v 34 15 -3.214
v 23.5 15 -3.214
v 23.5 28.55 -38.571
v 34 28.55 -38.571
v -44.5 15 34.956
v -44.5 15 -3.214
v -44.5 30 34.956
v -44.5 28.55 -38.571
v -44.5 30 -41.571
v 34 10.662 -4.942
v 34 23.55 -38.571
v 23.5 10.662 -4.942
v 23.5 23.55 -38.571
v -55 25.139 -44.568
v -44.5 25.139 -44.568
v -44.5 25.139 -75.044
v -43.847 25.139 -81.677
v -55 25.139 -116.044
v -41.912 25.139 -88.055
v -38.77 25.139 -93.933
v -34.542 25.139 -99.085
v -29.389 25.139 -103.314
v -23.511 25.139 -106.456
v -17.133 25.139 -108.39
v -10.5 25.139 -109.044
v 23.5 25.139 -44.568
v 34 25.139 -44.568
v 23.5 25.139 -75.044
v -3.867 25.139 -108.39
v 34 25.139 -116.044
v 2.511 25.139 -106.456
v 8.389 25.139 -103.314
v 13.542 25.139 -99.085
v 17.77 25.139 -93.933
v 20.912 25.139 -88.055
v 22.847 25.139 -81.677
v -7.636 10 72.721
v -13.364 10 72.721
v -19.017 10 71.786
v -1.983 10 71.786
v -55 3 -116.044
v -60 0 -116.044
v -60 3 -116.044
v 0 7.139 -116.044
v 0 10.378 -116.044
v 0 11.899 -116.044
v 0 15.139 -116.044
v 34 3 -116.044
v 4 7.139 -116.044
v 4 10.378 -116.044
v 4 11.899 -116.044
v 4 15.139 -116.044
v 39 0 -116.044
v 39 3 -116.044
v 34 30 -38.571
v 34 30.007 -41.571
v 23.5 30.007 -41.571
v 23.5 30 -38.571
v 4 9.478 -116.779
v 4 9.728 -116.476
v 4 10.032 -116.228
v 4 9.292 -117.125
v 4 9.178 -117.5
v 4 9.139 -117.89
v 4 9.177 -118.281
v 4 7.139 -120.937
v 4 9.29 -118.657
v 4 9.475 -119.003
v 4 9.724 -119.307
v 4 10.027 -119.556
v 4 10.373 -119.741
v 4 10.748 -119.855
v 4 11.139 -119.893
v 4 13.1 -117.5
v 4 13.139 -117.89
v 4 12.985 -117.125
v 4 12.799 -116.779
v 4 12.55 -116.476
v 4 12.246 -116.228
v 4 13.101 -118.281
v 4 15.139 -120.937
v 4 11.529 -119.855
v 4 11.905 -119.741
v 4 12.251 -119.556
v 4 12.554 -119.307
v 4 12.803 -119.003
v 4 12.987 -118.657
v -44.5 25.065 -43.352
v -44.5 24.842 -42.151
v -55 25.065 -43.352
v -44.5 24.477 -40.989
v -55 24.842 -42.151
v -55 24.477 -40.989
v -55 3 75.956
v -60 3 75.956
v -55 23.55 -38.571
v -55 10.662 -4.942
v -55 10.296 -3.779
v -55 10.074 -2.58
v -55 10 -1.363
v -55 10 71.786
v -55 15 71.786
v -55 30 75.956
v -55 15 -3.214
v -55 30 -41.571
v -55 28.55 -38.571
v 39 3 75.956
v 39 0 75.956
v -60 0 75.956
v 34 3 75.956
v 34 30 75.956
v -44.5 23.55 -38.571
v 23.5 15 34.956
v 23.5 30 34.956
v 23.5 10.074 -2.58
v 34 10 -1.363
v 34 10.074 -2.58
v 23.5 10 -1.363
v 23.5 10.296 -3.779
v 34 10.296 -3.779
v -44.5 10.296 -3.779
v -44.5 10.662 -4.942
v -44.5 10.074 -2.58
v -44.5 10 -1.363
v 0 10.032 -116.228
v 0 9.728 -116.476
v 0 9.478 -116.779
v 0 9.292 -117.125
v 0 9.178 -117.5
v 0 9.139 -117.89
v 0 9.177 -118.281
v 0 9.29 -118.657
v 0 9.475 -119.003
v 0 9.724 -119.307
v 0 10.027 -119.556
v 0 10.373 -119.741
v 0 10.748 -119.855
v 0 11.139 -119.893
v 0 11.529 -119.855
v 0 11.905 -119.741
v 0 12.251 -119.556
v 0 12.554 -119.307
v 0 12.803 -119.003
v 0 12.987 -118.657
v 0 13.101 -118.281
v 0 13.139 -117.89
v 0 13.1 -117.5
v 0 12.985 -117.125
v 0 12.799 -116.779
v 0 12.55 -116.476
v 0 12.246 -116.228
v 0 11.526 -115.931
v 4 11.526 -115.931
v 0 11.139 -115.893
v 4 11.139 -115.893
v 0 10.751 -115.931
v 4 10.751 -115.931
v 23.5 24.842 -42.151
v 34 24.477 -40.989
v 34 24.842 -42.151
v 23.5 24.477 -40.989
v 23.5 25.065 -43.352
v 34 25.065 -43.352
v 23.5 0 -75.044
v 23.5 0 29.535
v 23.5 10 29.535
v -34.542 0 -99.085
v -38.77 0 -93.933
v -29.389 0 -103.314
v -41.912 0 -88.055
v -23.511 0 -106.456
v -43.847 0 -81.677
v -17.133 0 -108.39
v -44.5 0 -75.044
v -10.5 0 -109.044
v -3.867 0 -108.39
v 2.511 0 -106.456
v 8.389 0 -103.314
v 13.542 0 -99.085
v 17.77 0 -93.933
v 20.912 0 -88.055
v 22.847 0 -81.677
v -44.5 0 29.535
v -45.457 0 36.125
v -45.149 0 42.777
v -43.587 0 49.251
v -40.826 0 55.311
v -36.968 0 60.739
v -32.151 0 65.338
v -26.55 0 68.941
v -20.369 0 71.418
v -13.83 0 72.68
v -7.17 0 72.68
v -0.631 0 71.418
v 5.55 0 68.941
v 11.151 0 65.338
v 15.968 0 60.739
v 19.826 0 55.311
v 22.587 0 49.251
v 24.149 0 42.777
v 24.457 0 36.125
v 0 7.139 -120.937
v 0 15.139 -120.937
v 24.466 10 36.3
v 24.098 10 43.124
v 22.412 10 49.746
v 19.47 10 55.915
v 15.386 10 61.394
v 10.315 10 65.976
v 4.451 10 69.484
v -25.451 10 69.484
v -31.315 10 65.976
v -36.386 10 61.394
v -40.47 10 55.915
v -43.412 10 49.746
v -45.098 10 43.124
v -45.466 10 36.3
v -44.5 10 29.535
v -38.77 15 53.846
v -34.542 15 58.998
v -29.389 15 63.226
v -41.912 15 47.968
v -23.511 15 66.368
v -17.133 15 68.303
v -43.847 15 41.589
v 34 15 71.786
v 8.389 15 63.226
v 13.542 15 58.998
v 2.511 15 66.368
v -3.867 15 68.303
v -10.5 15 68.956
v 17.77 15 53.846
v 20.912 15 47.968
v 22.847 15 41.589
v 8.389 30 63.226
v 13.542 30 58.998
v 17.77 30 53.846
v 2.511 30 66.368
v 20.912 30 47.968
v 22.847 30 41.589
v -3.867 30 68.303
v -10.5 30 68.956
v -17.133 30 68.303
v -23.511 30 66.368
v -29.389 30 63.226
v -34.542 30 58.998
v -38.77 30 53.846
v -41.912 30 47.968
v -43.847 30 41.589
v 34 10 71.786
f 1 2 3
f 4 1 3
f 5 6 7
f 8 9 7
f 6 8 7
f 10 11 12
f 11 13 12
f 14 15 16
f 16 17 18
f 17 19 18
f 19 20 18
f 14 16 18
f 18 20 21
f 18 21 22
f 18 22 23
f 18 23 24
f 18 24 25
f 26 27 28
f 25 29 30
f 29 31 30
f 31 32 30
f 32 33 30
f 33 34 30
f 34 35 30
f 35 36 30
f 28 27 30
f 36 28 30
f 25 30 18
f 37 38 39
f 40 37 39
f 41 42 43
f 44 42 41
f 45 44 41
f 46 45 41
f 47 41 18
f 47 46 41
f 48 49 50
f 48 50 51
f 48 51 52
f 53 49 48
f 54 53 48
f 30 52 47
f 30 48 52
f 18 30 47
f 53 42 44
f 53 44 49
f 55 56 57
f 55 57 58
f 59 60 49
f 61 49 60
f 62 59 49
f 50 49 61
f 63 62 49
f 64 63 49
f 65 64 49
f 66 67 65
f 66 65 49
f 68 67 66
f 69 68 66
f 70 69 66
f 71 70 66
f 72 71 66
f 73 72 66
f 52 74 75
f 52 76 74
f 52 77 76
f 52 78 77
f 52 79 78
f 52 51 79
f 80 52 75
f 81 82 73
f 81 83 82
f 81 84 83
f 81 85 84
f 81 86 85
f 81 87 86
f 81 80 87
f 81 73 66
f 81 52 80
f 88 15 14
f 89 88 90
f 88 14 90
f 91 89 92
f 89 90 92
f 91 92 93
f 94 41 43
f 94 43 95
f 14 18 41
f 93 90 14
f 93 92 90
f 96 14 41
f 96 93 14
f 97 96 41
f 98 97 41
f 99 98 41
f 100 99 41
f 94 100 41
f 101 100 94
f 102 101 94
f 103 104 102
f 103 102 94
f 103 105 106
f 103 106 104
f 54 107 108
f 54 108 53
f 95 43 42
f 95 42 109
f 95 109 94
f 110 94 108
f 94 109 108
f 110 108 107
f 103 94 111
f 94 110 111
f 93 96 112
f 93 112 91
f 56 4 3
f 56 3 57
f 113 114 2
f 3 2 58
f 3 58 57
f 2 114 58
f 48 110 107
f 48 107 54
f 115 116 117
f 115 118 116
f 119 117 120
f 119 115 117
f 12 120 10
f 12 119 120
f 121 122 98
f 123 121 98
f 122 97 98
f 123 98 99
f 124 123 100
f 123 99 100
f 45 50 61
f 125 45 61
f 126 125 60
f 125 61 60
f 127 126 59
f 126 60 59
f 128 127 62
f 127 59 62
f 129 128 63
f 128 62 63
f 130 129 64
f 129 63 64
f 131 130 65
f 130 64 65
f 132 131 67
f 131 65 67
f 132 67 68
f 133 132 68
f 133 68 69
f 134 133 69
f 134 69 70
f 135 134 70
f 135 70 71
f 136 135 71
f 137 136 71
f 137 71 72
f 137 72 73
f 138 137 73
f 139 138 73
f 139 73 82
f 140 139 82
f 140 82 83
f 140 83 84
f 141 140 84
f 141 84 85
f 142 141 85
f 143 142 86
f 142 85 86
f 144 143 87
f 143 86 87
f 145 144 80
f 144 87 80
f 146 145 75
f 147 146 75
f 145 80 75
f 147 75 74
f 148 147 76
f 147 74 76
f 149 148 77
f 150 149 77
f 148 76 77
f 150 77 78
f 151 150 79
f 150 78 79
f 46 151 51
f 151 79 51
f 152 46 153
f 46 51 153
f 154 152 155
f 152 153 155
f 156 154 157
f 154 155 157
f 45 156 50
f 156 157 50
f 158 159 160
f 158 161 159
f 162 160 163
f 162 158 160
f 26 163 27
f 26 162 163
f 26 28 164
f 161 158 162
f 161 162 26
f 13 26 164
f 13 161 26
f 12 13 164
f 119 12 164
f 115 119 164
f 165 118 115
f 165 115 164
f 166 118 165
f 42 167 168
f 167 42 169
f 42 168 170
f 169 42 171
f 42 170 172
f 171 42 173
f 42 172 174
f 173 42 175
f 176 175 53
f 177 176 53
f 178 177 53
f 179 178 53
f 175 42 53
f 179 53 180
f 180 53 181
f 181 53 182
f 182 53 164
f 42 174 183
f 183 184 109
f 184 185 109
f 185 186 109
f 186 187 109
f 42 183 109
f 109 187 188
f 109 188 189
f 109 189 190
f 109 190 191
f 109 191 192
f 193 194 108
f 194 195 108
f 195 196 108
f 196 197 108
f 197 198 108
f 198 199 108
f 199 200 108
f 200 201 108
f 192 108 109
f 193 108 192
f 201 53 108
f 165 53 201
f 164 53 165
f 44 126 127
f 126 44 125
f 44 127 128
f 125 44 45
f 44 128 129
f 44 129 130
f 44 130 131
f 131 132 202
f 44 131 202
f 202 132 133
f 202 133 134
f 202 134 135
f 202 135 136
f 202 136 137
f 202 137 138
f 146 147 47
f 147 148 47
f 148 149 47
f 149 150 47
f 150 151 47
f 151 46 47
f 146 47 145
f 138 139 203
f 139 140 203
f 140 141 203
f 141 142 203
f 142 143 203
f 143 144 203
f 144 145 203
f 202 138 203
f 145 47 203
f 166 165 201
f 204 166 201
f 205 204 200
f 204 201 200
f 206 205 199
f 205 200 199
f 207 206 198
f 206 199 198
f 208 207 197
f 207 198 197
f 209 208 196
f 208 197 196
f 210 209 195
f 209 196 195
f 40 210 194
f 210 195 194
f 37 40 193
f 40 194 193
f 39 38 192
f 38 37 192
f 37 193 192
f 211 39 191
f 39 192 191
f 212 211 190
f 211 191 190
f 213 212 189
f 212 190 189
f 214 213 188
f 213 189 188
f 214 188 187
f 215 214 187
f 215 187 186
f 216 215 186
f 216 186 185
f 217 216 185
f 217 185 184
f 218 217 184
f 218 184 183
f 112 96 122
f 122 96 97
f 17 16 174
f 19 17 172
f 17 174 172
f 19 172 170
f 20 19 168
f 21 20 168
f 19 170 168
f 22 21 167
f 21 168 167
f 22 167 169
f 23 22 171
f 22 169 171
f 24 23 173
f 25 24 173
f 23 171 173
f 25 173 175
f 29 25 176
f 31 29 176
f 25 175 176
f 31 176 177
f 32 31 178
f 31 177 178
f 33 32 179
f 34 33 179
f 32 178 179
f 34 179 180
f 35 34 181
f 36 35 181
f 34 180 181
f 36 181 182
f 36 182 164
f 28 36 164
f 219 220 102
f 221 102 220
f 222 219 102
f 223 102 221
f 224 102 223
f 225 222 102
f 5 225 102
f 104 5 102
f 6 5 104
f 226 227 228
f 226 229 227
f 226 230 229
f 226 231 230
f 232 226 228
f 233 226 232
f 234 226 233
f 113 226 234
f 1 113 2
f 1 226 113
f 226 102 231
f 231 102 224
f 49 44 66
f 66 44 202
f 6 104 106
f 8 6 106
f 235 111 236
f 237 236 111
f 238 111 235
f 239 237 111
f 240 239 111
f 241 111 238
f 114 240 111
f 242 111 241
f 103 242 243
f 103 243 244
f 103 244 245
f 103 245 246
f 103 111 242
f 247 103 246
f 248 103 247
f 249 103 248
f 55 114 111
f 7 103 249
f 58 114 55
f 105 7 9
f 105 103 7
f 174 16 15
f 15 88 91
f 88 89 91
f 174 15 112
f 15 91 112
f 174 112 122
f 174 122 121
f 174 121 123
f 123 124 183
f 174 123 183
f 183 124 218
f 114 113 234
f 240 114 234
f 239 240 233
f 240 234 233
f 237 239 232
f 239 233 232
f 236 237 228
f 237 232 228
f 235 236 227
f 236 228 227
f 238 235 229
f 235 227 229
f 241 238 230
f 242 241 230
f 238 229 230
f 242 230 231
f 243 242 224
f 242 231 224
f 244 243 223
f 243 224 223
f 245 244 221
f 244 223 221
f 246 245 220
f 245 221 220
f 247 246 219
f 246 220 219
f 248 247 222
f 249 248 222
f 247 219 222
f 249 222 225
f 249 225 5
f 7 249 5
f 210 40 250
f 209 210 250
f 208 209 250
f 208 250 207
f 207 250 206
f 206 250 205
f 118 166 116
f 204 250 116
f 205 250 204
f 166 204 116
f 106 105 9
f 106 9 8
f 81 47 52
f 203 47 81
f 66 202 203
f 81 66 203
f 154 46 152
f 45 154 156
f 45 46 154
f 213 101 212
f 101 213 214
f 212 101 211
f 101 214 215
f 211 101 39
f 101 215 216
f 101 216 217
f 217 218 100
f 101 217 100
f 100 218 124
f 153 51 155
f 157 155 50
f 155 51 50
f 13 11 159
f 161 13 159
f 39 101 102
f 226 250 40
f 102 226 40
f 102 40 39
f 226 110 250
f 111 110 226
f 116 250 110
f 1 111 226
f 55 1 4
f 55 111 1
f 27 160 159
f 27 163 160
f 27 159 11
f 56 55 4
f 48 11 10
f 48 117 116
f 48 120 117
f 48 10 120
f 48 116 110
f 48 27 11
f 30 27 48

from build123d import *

# Parameters (mm, degrees)
SKETCH1_W            = 89
SKETCH1_H            = 192
BOSS_EXTRUDE1_DEPTH  = 30
SKETCH2_R            = 34.99943994
CUT_EXTRUDE1_DEPTH   = 10
SKETCH3_W            = 75
SKETCH3_H            = 5
CUT_EXTRUDE2_DEPTH   = 102
CUT_EXTRUDE4_DEPTH   = 102
SKETCH6_W            = 10.5
SKETCH6_H            = 4
CUT_EXTRUDE7_DEPTH   = 8
BOSS_EXTRUDE2_DEPTH  = 10.5
CUT_EXTRUDE8_DEPTH   = 20.767757578
BOSS_EXTRUDE3_DEPTH  = 10.5
CUT_EXTRUDE9_DEPTH   = 22.812544275
BOSS_EXTRUDE6_DEPTH  = 10.5
BOSS_EXTRUDE7_DEPTH  = 10.5
FILLET1_R            = 10
FILLET2_R            = 10
FILLET3_R            = 10
FILLET4_R            = 10
CUT_EXTRUDE11_DEPTH  = 99
SKETCH15_W           = 7.554212703
SKETCH15_H           = 3.259234926
CUT_EXTRUDE12_DEPTH  = 99
FILLET5_R            = 10
SKETCH16_W           = 4.893814379
SKETCH16_H           = 8
BOSS_EXTRUDE8_DEPTH  = 4
SKETCH17_R           = 2
CUT_EXTRUDE13_DEPTH  = 4
SKETCH18_W           = 192
SKETCH18_H           = 3
BOSS_EXTRUDE9_DEPTH  = 5
SKETCH19_W           = 192
SKETCH19_H           = 3
BOSS_EXTRUDE10_DEPTH = 5


with BuildPart() as part:
    # Sketch1 → Boss-Extrude1 (new body)
    with BuildSketch(Plane(origin=(0, 0, 0), x_dir=(1, 0, 0), z_dir=(0, 1, 0))):
        with Locations((-10.5, 20.043668932)):
            Rectangle(SKETCH1_W, SKETCH1_H)
        with BuildLine():
            Line((-44.5, -34.956331068), (-44.5, 75.043668932))
            ThreePointArc((-44.5, 75.043668932), (-10.5, 109.043668932), (23.5, 75.043668932))
            Line((23.5, 75.043668932), (23.5, -34.956331068))
            ThreePointArc((23.5, -34.956331068), (-10.5, -68.956331068), (-44.5, -34.956331068))
        make_face(mode=Mode.SUBTRACT)
    extrude(amount=BOSS_EXTRUDE1_DEPTH)

    # Sketch2 → Cut-Extrude1 (cut)
    with BuildSketch(Plane.XZ):
        with Locations((-10.5, 37.838844027)):
            Circle(SKETCH2_R)
    extrude(amount=-CUT_EXTRUDE1_DEPTH, mode=Mode.SUBTRACT)

    # Sketch3 → Cut-Extrude2 (cut)
    with BuildSketch(Plane(origin=(34, 0, 0), x_dir=(0, 0, -1), z_dir=(1, 0, 0))):
        with Locations((-34.286288065, 12.5)):
            Rectangle(SKETCH3_W, SKETCH3_H)
    extrude(amount=-CUT_EXTRUDE2_DEPTH, mode=Mode.SUBTRACT)

    # Sketch4 → Cut-Extrude4 (cut)
    with BuildSketch(Plane.ZY.offset(55)):
        Polygon((-40.970715348, 29.469395922), (-41.211628541, 24.561719678), (-3.213711935, 10), (-3.213711935, 15), align=None)
    extrude(amount=-CUT_EXTRUDE4_DEPTH, mode=Mode.SUBTRACT)

    # Sketch6 → Cut-Extrude7 (cut)
    with BuildSketch(Plane(origin=(0, 30, 0), x_dir=(1, 0, 0), z_dir=(0, 1, 0))):
        with Locations((-49.75, 40.570603007)):
            Rectangle(SKETCH6_W, SKETCH6_H)
        with Locations((28.75, 40.570603007)):
            Rectangle(SKETCH6_W, SKETCH6_H)
    extrude(amount=-CUT_EXTRUDE7_DEPTH, mode=Mode.SUBTRACT)

    # Sketch7 → Boss-Extrude2 (add)
    with BuildSketch(Plane.ZY.offset(55)):
        Polygon((-38.570603007, 23.549614886), (-42.570603007, 25.082511526), (-42.570603007, 22), (-38.570603007, 22), align=None)
    extrude(amount=-BOSS_EXTRUDE2_DEPTH)

    # Sketch8 → Cut-Extrude8 (cut)
    with BuildSketch(Plane.ZY.offset(55)):
        Polygon((-42.570603007, 25.082511526), (-55.402488324, 30), (-42.570603007, 30), align=None)
    extrude(amount=-CUT_EXTRUDE8_DEPTH, mode=Mode.SUBTRACT)

    # Sketch9 → Boss-Extrude3 (add)
    with BuildSketch(Plane(origin=(34, 0, 0), x_dir=(0, 0, -1), z_dir=(1, 0, 0))):
        Polygon((38.570603007, 23.549614886), (42.570603007, 25.082511526), (42.570603007, 22), (38.570603007, 22), align=None)
    extrude(amount=-BOSS_EXTRUDE3_DEPTH)

    # Sketch10 → Cut-Extrude9 (cut)
    with BuildSketch(Plane(origin=(34, 0, 0), x_dir=(0, 0, -1), z_dir=(1, 0, 0))):
        Polygon((42.570603007, 25.082511526), (55.402488324, 30), (42.570603007, 30), align=None)
    extrude(amount=-CUT_EXTRUDE9_DEPTH, mode=Mode.SUBTRACT)

    # Sketch12 → Boss-Extrude6 (add)
    with BuildSketch(Plane.ZY.offset(55)):
        Polygon((-38.570603007, 30), (-41.570603007, 30), (-38.570603007, 28.549614886), align=None)
    extrude(amount=-BOSS_EXTRUDE6_DEPTH)

    # Sketch11 → Boss-Extrude7 (add)
    with BuildSketch(Plane(origin=(34, 0, 0), x_dir=(0, 0, -1), z_dir=(1, 0, 0))):
        Polygon((38.570603007, 28.549614886), (41.570603007, 30.007074027), (38.570603007, 30), align=None)
    extrude(amount=-BOSS_EXTRUDE7_DEPTH)

    # Fillet1
    fillet1_edges = [part.edges().sort_by_distance(p)[0] for p in [
        (-49.75, 30, -55.402488324),
    ]]
    fillet(fillet1_edges, radius=FILLET1_R)

    # Fillet2
    fillet2_edges = [part.edges().sort_by_distance(p)[0] for p in [
        (28.75, 30, -55.402488324),
    ]]
    fillet(fillet2_edges, radius=FILLET2_R)

    # Fillet3
    fillet3_edges = [part.edges().sort_by_distance(p)[0] for p in [
        (-49.75, 10, -3.213711935),
    ]]
    fillet(fillet3_edges, radius=FILLET3_R)

    # Fillet4
    fillet4_edges = [part.edges().sort_by_distance(p)[0] for p in [
        (28.75, 10, -3.213711935),
    ]]
    fillet(fillet4_edges, radius=FILLET4_R)

    # Sketch14 → Cut-Extrude11 (cut)
    with BuildSketch(Plane(origin=(34, 0, 0), x_dir=(0, 0, -1), z_dir=(1, 0, 0))):
        Polygon((42.717415751, 25.138773717), (116.043668932, 25.138773717), (116.043668932, 30), (57.252994033, 30), (53.674522762, 29.337801849), align=None)
    extrude(amount=-CUT_EXTRUDE11_DEPTH, mode=Mode.SUBTRACT)


with BuildPart() as cut_extrude11_piece_1:
    # of the separate pieces the step leaves, piece 1, a body of its own (cut_extrude11_pieces)
    add(part.part.solids().sort_by_distance((23.5, 25.138773717, -42.717415751))[0])

    # Fillet5
    fillet5_edges = [cut_extrude11_piece_1.edges().sort_by_distance(p)[0] for p in [
        (-49.75, 25.138773717, -42.717415751),
        (28.75, 25.138773717, -42.717415751),
    ]]
    fillet(fillet5_edges, radius=FILLET5_R)

    # Sketch16 → Boss-Extrude8 (add)
    with BuildSketch(Plane(origin=(0, 0, 0), x_dir=(0, 0, -1), z_dir=(1, 0, 0))):
        with Locations((118.490576121, 11.138773717)):
            Rectangle(SKETCH16_W, SKETCH16_H)
    extrude(amount=BOSS_EXTRUDE8_DEPTH)

    # Sketch17 → Cut-Extrude13 (cut)
    with BuildSketch(Plane(origin=(4, 0, 0), x_dir=(0, 0, -1), z_dir=(1, 0, 0))):
        with Locations(Location((117.893374439, 11.138773717, 0), (0, 0, 202.353838102))):
            Circle(SKETCH17_R)
    extrude(amount=-CUT_EXTRUDE13_DEPTH, mode=Mode.SUBTRACT)

    # Sketch18 → Boss-Extrude9 (add)
    with BuildSketch(Plane(origin=(34, 0, 0), x_dir=(0, 0, -1), z_dir=(1, 0, 0))):
        with Locations((20.043668932, 1.5)):
            Rectangle(SKETCH18_W, SKETCH18_H)
    extrude(amount=BOSS_EXTRUDE9_DEPTH)

    # Sketch19 → Boss-Extrude10 (add)
    with BuildSketch(Plane.ZY.offset(55)):
        with Locations((-20.043668932, 1.5)):
            Rectangle(SKETCH19_W, SKETCH19_H)
    extrude(amount=BOSS_EXTRUDE10_DEPTH)


with BuildPart() as cut_extrude11_piece_2:
    # of the separate pieces the step leaves, piece 2, a body of its own (cut_extrude11_pieces)
    add(part.part.solids().sort_by_distance((23.5, 30, -57.252994033))[0])


with BuildPart() as cut_extrude11_piece_3:
    # of the separate pieces the step leaves, piece 3, a body of its own (cut_extrude11_pieces)
    add(part.part.solids().sort_by_distance((-55, 30, -57.252994033))[0])


with BuildPart() as cut_extrude12_tool:
    # Sketch15 → Cut-Extrude12 (new body)
    with BuildSketch(Plane(origin=(34, 0, 0), x_dir=(0, 0, -1), z_dir=(1, 0, 0))):
        with Locations((54.846987071, 29.864387296)):
            Rectangle(SKETCH15_W, SKETCH15_H)
    extrude(amount=-CUT_EXTRUDE12_DEPTH)


with BuildPart() as cut_extrude11_piece_2_1:
    add(cut_extrude11_piece_2.part)

    # Cut-Extrude12: cut by cut_extrude12_tool
    add(cut_extrude12_tool.part, mode=Mode.SUBTRACT)


with BuildPart() as cut_extrude11_piece_3_1:
    add(cut_extrude11_piece_3.part)

    # Cut-Extrude12: cut by cut_extrude12_tool
    add(cut_extrude12_tool.part, mode=Mode.SUBTRACT)


solid = cut_extrude11_piece_1.part
